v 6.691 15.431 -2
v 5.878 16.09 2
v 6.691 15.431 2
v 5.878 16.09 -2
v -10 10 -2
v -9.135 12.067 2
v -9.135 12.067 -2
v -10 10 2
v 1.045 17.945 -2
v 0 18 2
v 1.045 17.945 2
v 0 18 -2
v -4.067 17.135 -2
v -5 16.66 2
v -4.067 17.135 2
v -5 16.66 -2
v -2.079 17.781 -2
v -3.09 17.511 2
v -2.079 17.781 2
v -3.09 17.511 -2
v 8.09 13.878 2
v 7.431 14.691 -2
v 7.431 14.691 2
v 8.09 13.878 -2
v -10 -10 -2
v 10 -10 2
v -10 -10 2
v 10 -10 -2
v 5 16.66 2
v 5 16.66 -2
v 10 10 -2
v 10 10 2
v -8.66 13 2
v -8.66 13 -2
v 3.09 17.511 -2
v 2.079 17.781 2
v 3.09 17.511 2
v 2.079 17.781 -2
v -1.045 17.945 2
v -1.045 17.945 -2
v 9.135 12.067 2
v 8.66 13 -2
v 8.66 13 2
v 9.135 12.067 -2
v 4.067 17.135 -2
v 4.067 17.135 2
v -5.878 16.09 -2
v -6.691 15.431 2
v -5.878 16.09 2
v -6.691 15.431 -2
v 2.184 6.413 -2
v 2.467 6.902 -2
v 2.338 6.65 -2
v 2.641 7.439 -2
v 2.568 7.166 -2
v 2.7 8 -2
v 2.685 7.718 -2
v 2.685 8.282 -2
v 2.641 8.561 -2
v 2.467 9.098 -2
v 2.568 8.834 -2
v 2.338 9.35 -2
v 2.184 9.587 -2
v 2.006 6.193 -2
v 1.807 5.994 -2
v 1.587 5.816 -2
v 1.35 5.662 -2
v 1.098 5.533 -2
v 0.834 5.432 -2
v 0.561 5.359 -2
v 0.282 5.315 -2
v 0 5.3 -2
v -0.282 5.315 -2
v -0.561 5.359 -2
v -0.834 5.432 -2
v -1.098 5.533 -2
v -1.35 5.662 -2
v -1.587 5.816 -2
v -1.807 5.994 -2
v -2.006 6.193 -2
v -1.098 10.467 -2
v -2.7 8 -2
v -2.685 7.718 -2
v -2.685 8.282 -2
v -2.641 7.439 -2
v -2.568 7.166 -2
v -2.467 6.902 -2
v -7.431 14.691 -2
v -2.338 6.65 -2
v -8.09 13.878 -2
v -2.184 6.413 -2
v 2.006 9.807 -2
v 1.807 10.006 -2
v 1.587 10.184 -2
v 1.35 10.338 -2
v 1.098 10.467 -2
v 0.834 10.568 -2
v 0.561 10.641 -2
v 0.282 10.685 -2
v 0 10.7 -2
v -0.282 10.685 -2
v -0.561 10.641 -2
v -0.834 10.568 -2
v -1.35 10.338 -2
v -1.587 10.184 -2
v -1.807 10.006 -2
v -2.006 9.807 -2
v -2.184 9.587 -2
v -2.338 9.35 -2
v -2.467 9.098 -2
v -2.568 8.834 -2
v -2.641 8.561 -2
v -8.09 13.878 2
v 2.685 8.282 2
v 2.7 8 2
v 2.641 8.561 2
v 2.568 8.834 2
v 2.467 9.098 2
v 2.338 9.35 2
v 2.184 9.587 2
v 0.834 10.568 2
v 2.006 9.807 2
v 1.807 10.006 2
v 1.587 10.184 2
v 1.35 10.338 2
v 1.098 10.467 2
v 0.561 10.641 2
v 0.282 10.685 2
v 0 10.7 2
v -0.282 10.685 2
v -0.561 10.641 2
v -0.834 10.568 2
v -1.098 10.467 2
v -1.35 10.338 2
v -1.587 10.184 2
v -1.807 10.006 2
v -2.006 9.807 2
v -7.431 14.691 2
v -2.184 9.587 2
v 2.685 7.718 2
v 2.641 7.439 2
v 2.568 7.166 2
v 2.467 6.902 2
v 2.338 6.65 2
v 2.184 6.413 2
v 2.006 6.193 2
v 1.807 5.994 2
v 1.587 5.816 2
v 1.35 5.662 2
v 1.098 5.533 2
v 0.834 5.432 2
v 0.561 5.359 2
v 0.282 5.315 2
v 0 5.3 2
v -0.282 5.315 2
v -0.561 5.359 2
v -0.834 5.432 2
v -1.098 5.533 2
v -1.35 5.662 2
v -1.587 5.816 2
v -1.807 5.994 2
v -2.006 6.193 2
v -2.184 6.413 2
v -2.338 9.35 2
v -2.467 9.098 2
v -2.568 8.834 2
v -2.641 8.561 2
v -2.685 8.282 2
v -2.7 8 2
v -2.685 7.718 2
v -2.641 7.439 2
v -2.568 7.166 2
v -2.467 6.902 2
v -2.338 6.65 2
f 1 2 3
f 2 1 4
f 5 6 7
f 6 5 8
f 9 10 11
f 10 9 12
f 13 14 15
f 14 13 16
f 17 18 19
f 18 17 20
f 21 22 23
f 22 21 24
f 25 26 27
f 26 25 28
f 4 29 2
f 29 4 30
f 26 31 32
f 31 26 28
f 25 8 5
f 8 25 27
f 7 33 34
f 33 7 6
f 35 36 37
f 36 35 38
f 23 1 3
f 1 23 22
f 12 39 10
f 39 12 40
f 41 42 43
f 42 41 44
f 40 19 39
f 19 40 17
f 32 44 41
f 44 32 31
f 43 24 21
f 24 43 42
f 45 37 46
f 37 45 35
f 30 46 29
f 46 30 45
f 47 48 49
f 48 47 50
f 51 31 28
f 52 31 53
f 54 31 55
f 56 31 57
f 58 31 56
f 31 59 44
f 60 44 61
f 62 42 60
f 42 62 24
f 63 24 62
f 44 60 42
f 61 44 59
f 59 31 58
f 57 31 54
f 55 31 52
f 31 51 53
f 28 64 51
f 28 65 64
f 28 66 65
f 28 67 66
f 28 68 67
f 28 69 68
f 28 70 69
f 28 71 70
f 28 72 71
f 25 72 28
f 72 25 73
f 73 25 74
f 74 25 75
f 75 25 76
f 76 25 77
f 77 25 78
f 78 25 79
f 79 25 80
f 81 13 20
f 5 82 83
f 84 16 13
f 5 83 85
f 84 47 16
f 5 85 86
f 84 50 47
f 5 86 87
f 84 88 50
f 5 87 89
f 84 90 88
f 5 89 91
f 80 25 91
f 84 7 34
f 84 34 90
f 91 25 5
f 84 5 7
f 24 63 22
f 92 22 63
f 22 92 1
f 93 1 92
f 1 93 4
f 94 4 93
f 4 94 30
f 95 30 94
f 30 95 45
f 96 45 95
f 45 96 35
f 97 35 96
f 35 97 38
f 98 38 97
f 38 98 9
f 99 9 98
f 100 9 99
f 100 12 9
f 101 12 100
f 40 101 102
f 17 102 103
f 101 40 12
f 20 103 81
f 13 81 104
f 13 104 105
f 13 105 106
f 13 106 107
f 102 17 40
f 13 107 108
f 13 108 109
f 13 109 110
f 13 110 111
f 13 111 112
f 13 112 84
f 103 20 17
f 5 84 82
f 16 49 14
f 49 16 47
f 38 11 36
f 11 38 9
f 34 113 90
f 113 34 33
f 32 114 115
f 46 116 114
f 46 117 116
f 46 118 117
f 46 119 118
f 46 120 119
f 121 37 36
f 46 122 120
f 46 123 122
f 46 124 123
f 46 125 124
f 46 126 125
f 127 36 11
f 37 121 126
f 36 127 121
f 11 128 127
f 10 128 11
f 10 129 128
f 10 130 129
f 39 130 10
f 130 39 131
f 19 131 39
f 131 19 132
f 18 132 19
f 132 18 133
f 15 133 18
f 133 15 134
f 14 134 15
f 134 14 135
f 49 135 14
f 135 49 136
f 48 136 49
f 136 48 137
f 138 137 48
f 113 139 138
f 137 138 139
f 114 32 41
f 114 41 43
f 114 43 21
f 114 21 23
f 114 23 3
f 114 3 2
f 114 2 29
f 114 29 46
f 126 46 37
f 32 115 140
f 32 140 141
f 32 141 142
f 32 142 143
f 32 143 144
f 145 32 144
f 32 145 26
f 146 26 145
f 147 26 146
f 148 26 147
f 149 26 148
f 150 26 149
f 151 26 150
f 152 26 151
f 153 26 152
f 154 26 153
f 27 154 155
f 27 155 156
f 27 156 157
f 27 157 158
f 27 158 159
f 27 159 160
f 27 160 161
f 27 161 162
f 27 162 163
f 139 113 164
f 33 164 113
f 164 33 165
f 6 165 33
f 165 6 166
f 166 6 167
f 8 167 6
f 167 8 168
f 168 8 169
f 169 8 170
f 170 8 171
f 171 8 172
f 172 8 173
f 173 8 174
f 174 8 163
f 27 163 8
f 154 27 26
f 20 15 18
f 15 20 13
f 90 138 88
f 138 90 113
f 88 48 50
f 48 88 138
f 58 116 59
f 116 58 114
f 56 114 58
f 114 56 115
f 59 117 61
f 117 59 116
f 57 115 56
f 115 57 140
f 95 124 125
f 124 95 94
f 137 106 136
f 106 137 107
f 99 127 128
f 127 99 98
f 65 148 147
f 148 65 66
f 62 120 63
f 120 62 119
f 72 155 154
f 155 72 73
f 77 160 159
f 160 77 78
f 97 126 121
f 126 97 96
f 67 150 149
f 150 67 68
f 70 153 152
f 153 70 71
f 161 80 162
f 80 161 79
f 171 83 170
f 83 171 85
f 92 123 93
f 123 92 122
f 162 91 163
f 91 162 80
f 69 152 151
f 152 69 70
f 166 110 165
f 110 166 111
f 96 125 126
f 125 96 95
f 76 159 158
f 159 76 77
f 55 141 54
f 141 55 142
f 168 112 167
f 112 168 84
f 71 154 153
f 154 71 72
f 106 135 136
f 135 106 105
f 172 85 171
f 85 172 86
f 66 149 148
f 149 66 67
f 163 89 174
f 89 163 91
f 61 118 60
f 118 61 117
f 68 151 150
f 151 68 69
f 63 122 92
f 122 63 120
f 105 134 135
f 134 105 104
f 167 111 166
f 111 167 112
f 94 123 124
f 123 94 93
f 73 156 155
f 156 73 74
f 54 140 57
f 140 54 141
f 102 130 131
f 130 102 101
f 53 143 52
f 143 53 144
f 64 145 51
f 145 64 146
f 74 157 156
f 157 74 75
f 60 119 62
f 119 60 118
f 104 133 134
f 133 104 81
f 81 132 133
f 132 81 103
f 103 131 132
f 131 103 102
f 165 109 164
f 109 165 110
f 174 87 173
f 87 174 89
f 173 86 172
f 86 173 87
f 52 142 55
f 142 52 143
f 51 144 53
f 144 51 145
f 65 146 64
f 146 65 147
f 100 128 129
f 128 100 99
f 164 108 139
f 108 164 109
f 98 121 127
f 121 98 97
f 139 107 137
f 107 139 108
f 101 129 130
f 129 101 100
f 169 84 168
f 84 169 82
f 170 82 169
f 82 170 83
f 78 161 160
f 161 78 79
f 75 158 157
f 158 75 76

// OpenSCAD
// Single-hole mounting tab.
$fn = 60;
eps = 0.02;
tab_w = 20;
tab_h = 36;
tab_t = 4;
difference() {
    hull() { translate([0,0,0]) cube([tab_w,tab_w,tab_t],center=true); translate([0,tab_h/2-tab_w/2,0]) cylinder(d=tab_w,h=tab_t,center=true); }
    translate([0,tab_h/2-tab_w/2,-tab_t/2-eps]) cylinder(d=5.4,h=tab_t+2*eps);
}
